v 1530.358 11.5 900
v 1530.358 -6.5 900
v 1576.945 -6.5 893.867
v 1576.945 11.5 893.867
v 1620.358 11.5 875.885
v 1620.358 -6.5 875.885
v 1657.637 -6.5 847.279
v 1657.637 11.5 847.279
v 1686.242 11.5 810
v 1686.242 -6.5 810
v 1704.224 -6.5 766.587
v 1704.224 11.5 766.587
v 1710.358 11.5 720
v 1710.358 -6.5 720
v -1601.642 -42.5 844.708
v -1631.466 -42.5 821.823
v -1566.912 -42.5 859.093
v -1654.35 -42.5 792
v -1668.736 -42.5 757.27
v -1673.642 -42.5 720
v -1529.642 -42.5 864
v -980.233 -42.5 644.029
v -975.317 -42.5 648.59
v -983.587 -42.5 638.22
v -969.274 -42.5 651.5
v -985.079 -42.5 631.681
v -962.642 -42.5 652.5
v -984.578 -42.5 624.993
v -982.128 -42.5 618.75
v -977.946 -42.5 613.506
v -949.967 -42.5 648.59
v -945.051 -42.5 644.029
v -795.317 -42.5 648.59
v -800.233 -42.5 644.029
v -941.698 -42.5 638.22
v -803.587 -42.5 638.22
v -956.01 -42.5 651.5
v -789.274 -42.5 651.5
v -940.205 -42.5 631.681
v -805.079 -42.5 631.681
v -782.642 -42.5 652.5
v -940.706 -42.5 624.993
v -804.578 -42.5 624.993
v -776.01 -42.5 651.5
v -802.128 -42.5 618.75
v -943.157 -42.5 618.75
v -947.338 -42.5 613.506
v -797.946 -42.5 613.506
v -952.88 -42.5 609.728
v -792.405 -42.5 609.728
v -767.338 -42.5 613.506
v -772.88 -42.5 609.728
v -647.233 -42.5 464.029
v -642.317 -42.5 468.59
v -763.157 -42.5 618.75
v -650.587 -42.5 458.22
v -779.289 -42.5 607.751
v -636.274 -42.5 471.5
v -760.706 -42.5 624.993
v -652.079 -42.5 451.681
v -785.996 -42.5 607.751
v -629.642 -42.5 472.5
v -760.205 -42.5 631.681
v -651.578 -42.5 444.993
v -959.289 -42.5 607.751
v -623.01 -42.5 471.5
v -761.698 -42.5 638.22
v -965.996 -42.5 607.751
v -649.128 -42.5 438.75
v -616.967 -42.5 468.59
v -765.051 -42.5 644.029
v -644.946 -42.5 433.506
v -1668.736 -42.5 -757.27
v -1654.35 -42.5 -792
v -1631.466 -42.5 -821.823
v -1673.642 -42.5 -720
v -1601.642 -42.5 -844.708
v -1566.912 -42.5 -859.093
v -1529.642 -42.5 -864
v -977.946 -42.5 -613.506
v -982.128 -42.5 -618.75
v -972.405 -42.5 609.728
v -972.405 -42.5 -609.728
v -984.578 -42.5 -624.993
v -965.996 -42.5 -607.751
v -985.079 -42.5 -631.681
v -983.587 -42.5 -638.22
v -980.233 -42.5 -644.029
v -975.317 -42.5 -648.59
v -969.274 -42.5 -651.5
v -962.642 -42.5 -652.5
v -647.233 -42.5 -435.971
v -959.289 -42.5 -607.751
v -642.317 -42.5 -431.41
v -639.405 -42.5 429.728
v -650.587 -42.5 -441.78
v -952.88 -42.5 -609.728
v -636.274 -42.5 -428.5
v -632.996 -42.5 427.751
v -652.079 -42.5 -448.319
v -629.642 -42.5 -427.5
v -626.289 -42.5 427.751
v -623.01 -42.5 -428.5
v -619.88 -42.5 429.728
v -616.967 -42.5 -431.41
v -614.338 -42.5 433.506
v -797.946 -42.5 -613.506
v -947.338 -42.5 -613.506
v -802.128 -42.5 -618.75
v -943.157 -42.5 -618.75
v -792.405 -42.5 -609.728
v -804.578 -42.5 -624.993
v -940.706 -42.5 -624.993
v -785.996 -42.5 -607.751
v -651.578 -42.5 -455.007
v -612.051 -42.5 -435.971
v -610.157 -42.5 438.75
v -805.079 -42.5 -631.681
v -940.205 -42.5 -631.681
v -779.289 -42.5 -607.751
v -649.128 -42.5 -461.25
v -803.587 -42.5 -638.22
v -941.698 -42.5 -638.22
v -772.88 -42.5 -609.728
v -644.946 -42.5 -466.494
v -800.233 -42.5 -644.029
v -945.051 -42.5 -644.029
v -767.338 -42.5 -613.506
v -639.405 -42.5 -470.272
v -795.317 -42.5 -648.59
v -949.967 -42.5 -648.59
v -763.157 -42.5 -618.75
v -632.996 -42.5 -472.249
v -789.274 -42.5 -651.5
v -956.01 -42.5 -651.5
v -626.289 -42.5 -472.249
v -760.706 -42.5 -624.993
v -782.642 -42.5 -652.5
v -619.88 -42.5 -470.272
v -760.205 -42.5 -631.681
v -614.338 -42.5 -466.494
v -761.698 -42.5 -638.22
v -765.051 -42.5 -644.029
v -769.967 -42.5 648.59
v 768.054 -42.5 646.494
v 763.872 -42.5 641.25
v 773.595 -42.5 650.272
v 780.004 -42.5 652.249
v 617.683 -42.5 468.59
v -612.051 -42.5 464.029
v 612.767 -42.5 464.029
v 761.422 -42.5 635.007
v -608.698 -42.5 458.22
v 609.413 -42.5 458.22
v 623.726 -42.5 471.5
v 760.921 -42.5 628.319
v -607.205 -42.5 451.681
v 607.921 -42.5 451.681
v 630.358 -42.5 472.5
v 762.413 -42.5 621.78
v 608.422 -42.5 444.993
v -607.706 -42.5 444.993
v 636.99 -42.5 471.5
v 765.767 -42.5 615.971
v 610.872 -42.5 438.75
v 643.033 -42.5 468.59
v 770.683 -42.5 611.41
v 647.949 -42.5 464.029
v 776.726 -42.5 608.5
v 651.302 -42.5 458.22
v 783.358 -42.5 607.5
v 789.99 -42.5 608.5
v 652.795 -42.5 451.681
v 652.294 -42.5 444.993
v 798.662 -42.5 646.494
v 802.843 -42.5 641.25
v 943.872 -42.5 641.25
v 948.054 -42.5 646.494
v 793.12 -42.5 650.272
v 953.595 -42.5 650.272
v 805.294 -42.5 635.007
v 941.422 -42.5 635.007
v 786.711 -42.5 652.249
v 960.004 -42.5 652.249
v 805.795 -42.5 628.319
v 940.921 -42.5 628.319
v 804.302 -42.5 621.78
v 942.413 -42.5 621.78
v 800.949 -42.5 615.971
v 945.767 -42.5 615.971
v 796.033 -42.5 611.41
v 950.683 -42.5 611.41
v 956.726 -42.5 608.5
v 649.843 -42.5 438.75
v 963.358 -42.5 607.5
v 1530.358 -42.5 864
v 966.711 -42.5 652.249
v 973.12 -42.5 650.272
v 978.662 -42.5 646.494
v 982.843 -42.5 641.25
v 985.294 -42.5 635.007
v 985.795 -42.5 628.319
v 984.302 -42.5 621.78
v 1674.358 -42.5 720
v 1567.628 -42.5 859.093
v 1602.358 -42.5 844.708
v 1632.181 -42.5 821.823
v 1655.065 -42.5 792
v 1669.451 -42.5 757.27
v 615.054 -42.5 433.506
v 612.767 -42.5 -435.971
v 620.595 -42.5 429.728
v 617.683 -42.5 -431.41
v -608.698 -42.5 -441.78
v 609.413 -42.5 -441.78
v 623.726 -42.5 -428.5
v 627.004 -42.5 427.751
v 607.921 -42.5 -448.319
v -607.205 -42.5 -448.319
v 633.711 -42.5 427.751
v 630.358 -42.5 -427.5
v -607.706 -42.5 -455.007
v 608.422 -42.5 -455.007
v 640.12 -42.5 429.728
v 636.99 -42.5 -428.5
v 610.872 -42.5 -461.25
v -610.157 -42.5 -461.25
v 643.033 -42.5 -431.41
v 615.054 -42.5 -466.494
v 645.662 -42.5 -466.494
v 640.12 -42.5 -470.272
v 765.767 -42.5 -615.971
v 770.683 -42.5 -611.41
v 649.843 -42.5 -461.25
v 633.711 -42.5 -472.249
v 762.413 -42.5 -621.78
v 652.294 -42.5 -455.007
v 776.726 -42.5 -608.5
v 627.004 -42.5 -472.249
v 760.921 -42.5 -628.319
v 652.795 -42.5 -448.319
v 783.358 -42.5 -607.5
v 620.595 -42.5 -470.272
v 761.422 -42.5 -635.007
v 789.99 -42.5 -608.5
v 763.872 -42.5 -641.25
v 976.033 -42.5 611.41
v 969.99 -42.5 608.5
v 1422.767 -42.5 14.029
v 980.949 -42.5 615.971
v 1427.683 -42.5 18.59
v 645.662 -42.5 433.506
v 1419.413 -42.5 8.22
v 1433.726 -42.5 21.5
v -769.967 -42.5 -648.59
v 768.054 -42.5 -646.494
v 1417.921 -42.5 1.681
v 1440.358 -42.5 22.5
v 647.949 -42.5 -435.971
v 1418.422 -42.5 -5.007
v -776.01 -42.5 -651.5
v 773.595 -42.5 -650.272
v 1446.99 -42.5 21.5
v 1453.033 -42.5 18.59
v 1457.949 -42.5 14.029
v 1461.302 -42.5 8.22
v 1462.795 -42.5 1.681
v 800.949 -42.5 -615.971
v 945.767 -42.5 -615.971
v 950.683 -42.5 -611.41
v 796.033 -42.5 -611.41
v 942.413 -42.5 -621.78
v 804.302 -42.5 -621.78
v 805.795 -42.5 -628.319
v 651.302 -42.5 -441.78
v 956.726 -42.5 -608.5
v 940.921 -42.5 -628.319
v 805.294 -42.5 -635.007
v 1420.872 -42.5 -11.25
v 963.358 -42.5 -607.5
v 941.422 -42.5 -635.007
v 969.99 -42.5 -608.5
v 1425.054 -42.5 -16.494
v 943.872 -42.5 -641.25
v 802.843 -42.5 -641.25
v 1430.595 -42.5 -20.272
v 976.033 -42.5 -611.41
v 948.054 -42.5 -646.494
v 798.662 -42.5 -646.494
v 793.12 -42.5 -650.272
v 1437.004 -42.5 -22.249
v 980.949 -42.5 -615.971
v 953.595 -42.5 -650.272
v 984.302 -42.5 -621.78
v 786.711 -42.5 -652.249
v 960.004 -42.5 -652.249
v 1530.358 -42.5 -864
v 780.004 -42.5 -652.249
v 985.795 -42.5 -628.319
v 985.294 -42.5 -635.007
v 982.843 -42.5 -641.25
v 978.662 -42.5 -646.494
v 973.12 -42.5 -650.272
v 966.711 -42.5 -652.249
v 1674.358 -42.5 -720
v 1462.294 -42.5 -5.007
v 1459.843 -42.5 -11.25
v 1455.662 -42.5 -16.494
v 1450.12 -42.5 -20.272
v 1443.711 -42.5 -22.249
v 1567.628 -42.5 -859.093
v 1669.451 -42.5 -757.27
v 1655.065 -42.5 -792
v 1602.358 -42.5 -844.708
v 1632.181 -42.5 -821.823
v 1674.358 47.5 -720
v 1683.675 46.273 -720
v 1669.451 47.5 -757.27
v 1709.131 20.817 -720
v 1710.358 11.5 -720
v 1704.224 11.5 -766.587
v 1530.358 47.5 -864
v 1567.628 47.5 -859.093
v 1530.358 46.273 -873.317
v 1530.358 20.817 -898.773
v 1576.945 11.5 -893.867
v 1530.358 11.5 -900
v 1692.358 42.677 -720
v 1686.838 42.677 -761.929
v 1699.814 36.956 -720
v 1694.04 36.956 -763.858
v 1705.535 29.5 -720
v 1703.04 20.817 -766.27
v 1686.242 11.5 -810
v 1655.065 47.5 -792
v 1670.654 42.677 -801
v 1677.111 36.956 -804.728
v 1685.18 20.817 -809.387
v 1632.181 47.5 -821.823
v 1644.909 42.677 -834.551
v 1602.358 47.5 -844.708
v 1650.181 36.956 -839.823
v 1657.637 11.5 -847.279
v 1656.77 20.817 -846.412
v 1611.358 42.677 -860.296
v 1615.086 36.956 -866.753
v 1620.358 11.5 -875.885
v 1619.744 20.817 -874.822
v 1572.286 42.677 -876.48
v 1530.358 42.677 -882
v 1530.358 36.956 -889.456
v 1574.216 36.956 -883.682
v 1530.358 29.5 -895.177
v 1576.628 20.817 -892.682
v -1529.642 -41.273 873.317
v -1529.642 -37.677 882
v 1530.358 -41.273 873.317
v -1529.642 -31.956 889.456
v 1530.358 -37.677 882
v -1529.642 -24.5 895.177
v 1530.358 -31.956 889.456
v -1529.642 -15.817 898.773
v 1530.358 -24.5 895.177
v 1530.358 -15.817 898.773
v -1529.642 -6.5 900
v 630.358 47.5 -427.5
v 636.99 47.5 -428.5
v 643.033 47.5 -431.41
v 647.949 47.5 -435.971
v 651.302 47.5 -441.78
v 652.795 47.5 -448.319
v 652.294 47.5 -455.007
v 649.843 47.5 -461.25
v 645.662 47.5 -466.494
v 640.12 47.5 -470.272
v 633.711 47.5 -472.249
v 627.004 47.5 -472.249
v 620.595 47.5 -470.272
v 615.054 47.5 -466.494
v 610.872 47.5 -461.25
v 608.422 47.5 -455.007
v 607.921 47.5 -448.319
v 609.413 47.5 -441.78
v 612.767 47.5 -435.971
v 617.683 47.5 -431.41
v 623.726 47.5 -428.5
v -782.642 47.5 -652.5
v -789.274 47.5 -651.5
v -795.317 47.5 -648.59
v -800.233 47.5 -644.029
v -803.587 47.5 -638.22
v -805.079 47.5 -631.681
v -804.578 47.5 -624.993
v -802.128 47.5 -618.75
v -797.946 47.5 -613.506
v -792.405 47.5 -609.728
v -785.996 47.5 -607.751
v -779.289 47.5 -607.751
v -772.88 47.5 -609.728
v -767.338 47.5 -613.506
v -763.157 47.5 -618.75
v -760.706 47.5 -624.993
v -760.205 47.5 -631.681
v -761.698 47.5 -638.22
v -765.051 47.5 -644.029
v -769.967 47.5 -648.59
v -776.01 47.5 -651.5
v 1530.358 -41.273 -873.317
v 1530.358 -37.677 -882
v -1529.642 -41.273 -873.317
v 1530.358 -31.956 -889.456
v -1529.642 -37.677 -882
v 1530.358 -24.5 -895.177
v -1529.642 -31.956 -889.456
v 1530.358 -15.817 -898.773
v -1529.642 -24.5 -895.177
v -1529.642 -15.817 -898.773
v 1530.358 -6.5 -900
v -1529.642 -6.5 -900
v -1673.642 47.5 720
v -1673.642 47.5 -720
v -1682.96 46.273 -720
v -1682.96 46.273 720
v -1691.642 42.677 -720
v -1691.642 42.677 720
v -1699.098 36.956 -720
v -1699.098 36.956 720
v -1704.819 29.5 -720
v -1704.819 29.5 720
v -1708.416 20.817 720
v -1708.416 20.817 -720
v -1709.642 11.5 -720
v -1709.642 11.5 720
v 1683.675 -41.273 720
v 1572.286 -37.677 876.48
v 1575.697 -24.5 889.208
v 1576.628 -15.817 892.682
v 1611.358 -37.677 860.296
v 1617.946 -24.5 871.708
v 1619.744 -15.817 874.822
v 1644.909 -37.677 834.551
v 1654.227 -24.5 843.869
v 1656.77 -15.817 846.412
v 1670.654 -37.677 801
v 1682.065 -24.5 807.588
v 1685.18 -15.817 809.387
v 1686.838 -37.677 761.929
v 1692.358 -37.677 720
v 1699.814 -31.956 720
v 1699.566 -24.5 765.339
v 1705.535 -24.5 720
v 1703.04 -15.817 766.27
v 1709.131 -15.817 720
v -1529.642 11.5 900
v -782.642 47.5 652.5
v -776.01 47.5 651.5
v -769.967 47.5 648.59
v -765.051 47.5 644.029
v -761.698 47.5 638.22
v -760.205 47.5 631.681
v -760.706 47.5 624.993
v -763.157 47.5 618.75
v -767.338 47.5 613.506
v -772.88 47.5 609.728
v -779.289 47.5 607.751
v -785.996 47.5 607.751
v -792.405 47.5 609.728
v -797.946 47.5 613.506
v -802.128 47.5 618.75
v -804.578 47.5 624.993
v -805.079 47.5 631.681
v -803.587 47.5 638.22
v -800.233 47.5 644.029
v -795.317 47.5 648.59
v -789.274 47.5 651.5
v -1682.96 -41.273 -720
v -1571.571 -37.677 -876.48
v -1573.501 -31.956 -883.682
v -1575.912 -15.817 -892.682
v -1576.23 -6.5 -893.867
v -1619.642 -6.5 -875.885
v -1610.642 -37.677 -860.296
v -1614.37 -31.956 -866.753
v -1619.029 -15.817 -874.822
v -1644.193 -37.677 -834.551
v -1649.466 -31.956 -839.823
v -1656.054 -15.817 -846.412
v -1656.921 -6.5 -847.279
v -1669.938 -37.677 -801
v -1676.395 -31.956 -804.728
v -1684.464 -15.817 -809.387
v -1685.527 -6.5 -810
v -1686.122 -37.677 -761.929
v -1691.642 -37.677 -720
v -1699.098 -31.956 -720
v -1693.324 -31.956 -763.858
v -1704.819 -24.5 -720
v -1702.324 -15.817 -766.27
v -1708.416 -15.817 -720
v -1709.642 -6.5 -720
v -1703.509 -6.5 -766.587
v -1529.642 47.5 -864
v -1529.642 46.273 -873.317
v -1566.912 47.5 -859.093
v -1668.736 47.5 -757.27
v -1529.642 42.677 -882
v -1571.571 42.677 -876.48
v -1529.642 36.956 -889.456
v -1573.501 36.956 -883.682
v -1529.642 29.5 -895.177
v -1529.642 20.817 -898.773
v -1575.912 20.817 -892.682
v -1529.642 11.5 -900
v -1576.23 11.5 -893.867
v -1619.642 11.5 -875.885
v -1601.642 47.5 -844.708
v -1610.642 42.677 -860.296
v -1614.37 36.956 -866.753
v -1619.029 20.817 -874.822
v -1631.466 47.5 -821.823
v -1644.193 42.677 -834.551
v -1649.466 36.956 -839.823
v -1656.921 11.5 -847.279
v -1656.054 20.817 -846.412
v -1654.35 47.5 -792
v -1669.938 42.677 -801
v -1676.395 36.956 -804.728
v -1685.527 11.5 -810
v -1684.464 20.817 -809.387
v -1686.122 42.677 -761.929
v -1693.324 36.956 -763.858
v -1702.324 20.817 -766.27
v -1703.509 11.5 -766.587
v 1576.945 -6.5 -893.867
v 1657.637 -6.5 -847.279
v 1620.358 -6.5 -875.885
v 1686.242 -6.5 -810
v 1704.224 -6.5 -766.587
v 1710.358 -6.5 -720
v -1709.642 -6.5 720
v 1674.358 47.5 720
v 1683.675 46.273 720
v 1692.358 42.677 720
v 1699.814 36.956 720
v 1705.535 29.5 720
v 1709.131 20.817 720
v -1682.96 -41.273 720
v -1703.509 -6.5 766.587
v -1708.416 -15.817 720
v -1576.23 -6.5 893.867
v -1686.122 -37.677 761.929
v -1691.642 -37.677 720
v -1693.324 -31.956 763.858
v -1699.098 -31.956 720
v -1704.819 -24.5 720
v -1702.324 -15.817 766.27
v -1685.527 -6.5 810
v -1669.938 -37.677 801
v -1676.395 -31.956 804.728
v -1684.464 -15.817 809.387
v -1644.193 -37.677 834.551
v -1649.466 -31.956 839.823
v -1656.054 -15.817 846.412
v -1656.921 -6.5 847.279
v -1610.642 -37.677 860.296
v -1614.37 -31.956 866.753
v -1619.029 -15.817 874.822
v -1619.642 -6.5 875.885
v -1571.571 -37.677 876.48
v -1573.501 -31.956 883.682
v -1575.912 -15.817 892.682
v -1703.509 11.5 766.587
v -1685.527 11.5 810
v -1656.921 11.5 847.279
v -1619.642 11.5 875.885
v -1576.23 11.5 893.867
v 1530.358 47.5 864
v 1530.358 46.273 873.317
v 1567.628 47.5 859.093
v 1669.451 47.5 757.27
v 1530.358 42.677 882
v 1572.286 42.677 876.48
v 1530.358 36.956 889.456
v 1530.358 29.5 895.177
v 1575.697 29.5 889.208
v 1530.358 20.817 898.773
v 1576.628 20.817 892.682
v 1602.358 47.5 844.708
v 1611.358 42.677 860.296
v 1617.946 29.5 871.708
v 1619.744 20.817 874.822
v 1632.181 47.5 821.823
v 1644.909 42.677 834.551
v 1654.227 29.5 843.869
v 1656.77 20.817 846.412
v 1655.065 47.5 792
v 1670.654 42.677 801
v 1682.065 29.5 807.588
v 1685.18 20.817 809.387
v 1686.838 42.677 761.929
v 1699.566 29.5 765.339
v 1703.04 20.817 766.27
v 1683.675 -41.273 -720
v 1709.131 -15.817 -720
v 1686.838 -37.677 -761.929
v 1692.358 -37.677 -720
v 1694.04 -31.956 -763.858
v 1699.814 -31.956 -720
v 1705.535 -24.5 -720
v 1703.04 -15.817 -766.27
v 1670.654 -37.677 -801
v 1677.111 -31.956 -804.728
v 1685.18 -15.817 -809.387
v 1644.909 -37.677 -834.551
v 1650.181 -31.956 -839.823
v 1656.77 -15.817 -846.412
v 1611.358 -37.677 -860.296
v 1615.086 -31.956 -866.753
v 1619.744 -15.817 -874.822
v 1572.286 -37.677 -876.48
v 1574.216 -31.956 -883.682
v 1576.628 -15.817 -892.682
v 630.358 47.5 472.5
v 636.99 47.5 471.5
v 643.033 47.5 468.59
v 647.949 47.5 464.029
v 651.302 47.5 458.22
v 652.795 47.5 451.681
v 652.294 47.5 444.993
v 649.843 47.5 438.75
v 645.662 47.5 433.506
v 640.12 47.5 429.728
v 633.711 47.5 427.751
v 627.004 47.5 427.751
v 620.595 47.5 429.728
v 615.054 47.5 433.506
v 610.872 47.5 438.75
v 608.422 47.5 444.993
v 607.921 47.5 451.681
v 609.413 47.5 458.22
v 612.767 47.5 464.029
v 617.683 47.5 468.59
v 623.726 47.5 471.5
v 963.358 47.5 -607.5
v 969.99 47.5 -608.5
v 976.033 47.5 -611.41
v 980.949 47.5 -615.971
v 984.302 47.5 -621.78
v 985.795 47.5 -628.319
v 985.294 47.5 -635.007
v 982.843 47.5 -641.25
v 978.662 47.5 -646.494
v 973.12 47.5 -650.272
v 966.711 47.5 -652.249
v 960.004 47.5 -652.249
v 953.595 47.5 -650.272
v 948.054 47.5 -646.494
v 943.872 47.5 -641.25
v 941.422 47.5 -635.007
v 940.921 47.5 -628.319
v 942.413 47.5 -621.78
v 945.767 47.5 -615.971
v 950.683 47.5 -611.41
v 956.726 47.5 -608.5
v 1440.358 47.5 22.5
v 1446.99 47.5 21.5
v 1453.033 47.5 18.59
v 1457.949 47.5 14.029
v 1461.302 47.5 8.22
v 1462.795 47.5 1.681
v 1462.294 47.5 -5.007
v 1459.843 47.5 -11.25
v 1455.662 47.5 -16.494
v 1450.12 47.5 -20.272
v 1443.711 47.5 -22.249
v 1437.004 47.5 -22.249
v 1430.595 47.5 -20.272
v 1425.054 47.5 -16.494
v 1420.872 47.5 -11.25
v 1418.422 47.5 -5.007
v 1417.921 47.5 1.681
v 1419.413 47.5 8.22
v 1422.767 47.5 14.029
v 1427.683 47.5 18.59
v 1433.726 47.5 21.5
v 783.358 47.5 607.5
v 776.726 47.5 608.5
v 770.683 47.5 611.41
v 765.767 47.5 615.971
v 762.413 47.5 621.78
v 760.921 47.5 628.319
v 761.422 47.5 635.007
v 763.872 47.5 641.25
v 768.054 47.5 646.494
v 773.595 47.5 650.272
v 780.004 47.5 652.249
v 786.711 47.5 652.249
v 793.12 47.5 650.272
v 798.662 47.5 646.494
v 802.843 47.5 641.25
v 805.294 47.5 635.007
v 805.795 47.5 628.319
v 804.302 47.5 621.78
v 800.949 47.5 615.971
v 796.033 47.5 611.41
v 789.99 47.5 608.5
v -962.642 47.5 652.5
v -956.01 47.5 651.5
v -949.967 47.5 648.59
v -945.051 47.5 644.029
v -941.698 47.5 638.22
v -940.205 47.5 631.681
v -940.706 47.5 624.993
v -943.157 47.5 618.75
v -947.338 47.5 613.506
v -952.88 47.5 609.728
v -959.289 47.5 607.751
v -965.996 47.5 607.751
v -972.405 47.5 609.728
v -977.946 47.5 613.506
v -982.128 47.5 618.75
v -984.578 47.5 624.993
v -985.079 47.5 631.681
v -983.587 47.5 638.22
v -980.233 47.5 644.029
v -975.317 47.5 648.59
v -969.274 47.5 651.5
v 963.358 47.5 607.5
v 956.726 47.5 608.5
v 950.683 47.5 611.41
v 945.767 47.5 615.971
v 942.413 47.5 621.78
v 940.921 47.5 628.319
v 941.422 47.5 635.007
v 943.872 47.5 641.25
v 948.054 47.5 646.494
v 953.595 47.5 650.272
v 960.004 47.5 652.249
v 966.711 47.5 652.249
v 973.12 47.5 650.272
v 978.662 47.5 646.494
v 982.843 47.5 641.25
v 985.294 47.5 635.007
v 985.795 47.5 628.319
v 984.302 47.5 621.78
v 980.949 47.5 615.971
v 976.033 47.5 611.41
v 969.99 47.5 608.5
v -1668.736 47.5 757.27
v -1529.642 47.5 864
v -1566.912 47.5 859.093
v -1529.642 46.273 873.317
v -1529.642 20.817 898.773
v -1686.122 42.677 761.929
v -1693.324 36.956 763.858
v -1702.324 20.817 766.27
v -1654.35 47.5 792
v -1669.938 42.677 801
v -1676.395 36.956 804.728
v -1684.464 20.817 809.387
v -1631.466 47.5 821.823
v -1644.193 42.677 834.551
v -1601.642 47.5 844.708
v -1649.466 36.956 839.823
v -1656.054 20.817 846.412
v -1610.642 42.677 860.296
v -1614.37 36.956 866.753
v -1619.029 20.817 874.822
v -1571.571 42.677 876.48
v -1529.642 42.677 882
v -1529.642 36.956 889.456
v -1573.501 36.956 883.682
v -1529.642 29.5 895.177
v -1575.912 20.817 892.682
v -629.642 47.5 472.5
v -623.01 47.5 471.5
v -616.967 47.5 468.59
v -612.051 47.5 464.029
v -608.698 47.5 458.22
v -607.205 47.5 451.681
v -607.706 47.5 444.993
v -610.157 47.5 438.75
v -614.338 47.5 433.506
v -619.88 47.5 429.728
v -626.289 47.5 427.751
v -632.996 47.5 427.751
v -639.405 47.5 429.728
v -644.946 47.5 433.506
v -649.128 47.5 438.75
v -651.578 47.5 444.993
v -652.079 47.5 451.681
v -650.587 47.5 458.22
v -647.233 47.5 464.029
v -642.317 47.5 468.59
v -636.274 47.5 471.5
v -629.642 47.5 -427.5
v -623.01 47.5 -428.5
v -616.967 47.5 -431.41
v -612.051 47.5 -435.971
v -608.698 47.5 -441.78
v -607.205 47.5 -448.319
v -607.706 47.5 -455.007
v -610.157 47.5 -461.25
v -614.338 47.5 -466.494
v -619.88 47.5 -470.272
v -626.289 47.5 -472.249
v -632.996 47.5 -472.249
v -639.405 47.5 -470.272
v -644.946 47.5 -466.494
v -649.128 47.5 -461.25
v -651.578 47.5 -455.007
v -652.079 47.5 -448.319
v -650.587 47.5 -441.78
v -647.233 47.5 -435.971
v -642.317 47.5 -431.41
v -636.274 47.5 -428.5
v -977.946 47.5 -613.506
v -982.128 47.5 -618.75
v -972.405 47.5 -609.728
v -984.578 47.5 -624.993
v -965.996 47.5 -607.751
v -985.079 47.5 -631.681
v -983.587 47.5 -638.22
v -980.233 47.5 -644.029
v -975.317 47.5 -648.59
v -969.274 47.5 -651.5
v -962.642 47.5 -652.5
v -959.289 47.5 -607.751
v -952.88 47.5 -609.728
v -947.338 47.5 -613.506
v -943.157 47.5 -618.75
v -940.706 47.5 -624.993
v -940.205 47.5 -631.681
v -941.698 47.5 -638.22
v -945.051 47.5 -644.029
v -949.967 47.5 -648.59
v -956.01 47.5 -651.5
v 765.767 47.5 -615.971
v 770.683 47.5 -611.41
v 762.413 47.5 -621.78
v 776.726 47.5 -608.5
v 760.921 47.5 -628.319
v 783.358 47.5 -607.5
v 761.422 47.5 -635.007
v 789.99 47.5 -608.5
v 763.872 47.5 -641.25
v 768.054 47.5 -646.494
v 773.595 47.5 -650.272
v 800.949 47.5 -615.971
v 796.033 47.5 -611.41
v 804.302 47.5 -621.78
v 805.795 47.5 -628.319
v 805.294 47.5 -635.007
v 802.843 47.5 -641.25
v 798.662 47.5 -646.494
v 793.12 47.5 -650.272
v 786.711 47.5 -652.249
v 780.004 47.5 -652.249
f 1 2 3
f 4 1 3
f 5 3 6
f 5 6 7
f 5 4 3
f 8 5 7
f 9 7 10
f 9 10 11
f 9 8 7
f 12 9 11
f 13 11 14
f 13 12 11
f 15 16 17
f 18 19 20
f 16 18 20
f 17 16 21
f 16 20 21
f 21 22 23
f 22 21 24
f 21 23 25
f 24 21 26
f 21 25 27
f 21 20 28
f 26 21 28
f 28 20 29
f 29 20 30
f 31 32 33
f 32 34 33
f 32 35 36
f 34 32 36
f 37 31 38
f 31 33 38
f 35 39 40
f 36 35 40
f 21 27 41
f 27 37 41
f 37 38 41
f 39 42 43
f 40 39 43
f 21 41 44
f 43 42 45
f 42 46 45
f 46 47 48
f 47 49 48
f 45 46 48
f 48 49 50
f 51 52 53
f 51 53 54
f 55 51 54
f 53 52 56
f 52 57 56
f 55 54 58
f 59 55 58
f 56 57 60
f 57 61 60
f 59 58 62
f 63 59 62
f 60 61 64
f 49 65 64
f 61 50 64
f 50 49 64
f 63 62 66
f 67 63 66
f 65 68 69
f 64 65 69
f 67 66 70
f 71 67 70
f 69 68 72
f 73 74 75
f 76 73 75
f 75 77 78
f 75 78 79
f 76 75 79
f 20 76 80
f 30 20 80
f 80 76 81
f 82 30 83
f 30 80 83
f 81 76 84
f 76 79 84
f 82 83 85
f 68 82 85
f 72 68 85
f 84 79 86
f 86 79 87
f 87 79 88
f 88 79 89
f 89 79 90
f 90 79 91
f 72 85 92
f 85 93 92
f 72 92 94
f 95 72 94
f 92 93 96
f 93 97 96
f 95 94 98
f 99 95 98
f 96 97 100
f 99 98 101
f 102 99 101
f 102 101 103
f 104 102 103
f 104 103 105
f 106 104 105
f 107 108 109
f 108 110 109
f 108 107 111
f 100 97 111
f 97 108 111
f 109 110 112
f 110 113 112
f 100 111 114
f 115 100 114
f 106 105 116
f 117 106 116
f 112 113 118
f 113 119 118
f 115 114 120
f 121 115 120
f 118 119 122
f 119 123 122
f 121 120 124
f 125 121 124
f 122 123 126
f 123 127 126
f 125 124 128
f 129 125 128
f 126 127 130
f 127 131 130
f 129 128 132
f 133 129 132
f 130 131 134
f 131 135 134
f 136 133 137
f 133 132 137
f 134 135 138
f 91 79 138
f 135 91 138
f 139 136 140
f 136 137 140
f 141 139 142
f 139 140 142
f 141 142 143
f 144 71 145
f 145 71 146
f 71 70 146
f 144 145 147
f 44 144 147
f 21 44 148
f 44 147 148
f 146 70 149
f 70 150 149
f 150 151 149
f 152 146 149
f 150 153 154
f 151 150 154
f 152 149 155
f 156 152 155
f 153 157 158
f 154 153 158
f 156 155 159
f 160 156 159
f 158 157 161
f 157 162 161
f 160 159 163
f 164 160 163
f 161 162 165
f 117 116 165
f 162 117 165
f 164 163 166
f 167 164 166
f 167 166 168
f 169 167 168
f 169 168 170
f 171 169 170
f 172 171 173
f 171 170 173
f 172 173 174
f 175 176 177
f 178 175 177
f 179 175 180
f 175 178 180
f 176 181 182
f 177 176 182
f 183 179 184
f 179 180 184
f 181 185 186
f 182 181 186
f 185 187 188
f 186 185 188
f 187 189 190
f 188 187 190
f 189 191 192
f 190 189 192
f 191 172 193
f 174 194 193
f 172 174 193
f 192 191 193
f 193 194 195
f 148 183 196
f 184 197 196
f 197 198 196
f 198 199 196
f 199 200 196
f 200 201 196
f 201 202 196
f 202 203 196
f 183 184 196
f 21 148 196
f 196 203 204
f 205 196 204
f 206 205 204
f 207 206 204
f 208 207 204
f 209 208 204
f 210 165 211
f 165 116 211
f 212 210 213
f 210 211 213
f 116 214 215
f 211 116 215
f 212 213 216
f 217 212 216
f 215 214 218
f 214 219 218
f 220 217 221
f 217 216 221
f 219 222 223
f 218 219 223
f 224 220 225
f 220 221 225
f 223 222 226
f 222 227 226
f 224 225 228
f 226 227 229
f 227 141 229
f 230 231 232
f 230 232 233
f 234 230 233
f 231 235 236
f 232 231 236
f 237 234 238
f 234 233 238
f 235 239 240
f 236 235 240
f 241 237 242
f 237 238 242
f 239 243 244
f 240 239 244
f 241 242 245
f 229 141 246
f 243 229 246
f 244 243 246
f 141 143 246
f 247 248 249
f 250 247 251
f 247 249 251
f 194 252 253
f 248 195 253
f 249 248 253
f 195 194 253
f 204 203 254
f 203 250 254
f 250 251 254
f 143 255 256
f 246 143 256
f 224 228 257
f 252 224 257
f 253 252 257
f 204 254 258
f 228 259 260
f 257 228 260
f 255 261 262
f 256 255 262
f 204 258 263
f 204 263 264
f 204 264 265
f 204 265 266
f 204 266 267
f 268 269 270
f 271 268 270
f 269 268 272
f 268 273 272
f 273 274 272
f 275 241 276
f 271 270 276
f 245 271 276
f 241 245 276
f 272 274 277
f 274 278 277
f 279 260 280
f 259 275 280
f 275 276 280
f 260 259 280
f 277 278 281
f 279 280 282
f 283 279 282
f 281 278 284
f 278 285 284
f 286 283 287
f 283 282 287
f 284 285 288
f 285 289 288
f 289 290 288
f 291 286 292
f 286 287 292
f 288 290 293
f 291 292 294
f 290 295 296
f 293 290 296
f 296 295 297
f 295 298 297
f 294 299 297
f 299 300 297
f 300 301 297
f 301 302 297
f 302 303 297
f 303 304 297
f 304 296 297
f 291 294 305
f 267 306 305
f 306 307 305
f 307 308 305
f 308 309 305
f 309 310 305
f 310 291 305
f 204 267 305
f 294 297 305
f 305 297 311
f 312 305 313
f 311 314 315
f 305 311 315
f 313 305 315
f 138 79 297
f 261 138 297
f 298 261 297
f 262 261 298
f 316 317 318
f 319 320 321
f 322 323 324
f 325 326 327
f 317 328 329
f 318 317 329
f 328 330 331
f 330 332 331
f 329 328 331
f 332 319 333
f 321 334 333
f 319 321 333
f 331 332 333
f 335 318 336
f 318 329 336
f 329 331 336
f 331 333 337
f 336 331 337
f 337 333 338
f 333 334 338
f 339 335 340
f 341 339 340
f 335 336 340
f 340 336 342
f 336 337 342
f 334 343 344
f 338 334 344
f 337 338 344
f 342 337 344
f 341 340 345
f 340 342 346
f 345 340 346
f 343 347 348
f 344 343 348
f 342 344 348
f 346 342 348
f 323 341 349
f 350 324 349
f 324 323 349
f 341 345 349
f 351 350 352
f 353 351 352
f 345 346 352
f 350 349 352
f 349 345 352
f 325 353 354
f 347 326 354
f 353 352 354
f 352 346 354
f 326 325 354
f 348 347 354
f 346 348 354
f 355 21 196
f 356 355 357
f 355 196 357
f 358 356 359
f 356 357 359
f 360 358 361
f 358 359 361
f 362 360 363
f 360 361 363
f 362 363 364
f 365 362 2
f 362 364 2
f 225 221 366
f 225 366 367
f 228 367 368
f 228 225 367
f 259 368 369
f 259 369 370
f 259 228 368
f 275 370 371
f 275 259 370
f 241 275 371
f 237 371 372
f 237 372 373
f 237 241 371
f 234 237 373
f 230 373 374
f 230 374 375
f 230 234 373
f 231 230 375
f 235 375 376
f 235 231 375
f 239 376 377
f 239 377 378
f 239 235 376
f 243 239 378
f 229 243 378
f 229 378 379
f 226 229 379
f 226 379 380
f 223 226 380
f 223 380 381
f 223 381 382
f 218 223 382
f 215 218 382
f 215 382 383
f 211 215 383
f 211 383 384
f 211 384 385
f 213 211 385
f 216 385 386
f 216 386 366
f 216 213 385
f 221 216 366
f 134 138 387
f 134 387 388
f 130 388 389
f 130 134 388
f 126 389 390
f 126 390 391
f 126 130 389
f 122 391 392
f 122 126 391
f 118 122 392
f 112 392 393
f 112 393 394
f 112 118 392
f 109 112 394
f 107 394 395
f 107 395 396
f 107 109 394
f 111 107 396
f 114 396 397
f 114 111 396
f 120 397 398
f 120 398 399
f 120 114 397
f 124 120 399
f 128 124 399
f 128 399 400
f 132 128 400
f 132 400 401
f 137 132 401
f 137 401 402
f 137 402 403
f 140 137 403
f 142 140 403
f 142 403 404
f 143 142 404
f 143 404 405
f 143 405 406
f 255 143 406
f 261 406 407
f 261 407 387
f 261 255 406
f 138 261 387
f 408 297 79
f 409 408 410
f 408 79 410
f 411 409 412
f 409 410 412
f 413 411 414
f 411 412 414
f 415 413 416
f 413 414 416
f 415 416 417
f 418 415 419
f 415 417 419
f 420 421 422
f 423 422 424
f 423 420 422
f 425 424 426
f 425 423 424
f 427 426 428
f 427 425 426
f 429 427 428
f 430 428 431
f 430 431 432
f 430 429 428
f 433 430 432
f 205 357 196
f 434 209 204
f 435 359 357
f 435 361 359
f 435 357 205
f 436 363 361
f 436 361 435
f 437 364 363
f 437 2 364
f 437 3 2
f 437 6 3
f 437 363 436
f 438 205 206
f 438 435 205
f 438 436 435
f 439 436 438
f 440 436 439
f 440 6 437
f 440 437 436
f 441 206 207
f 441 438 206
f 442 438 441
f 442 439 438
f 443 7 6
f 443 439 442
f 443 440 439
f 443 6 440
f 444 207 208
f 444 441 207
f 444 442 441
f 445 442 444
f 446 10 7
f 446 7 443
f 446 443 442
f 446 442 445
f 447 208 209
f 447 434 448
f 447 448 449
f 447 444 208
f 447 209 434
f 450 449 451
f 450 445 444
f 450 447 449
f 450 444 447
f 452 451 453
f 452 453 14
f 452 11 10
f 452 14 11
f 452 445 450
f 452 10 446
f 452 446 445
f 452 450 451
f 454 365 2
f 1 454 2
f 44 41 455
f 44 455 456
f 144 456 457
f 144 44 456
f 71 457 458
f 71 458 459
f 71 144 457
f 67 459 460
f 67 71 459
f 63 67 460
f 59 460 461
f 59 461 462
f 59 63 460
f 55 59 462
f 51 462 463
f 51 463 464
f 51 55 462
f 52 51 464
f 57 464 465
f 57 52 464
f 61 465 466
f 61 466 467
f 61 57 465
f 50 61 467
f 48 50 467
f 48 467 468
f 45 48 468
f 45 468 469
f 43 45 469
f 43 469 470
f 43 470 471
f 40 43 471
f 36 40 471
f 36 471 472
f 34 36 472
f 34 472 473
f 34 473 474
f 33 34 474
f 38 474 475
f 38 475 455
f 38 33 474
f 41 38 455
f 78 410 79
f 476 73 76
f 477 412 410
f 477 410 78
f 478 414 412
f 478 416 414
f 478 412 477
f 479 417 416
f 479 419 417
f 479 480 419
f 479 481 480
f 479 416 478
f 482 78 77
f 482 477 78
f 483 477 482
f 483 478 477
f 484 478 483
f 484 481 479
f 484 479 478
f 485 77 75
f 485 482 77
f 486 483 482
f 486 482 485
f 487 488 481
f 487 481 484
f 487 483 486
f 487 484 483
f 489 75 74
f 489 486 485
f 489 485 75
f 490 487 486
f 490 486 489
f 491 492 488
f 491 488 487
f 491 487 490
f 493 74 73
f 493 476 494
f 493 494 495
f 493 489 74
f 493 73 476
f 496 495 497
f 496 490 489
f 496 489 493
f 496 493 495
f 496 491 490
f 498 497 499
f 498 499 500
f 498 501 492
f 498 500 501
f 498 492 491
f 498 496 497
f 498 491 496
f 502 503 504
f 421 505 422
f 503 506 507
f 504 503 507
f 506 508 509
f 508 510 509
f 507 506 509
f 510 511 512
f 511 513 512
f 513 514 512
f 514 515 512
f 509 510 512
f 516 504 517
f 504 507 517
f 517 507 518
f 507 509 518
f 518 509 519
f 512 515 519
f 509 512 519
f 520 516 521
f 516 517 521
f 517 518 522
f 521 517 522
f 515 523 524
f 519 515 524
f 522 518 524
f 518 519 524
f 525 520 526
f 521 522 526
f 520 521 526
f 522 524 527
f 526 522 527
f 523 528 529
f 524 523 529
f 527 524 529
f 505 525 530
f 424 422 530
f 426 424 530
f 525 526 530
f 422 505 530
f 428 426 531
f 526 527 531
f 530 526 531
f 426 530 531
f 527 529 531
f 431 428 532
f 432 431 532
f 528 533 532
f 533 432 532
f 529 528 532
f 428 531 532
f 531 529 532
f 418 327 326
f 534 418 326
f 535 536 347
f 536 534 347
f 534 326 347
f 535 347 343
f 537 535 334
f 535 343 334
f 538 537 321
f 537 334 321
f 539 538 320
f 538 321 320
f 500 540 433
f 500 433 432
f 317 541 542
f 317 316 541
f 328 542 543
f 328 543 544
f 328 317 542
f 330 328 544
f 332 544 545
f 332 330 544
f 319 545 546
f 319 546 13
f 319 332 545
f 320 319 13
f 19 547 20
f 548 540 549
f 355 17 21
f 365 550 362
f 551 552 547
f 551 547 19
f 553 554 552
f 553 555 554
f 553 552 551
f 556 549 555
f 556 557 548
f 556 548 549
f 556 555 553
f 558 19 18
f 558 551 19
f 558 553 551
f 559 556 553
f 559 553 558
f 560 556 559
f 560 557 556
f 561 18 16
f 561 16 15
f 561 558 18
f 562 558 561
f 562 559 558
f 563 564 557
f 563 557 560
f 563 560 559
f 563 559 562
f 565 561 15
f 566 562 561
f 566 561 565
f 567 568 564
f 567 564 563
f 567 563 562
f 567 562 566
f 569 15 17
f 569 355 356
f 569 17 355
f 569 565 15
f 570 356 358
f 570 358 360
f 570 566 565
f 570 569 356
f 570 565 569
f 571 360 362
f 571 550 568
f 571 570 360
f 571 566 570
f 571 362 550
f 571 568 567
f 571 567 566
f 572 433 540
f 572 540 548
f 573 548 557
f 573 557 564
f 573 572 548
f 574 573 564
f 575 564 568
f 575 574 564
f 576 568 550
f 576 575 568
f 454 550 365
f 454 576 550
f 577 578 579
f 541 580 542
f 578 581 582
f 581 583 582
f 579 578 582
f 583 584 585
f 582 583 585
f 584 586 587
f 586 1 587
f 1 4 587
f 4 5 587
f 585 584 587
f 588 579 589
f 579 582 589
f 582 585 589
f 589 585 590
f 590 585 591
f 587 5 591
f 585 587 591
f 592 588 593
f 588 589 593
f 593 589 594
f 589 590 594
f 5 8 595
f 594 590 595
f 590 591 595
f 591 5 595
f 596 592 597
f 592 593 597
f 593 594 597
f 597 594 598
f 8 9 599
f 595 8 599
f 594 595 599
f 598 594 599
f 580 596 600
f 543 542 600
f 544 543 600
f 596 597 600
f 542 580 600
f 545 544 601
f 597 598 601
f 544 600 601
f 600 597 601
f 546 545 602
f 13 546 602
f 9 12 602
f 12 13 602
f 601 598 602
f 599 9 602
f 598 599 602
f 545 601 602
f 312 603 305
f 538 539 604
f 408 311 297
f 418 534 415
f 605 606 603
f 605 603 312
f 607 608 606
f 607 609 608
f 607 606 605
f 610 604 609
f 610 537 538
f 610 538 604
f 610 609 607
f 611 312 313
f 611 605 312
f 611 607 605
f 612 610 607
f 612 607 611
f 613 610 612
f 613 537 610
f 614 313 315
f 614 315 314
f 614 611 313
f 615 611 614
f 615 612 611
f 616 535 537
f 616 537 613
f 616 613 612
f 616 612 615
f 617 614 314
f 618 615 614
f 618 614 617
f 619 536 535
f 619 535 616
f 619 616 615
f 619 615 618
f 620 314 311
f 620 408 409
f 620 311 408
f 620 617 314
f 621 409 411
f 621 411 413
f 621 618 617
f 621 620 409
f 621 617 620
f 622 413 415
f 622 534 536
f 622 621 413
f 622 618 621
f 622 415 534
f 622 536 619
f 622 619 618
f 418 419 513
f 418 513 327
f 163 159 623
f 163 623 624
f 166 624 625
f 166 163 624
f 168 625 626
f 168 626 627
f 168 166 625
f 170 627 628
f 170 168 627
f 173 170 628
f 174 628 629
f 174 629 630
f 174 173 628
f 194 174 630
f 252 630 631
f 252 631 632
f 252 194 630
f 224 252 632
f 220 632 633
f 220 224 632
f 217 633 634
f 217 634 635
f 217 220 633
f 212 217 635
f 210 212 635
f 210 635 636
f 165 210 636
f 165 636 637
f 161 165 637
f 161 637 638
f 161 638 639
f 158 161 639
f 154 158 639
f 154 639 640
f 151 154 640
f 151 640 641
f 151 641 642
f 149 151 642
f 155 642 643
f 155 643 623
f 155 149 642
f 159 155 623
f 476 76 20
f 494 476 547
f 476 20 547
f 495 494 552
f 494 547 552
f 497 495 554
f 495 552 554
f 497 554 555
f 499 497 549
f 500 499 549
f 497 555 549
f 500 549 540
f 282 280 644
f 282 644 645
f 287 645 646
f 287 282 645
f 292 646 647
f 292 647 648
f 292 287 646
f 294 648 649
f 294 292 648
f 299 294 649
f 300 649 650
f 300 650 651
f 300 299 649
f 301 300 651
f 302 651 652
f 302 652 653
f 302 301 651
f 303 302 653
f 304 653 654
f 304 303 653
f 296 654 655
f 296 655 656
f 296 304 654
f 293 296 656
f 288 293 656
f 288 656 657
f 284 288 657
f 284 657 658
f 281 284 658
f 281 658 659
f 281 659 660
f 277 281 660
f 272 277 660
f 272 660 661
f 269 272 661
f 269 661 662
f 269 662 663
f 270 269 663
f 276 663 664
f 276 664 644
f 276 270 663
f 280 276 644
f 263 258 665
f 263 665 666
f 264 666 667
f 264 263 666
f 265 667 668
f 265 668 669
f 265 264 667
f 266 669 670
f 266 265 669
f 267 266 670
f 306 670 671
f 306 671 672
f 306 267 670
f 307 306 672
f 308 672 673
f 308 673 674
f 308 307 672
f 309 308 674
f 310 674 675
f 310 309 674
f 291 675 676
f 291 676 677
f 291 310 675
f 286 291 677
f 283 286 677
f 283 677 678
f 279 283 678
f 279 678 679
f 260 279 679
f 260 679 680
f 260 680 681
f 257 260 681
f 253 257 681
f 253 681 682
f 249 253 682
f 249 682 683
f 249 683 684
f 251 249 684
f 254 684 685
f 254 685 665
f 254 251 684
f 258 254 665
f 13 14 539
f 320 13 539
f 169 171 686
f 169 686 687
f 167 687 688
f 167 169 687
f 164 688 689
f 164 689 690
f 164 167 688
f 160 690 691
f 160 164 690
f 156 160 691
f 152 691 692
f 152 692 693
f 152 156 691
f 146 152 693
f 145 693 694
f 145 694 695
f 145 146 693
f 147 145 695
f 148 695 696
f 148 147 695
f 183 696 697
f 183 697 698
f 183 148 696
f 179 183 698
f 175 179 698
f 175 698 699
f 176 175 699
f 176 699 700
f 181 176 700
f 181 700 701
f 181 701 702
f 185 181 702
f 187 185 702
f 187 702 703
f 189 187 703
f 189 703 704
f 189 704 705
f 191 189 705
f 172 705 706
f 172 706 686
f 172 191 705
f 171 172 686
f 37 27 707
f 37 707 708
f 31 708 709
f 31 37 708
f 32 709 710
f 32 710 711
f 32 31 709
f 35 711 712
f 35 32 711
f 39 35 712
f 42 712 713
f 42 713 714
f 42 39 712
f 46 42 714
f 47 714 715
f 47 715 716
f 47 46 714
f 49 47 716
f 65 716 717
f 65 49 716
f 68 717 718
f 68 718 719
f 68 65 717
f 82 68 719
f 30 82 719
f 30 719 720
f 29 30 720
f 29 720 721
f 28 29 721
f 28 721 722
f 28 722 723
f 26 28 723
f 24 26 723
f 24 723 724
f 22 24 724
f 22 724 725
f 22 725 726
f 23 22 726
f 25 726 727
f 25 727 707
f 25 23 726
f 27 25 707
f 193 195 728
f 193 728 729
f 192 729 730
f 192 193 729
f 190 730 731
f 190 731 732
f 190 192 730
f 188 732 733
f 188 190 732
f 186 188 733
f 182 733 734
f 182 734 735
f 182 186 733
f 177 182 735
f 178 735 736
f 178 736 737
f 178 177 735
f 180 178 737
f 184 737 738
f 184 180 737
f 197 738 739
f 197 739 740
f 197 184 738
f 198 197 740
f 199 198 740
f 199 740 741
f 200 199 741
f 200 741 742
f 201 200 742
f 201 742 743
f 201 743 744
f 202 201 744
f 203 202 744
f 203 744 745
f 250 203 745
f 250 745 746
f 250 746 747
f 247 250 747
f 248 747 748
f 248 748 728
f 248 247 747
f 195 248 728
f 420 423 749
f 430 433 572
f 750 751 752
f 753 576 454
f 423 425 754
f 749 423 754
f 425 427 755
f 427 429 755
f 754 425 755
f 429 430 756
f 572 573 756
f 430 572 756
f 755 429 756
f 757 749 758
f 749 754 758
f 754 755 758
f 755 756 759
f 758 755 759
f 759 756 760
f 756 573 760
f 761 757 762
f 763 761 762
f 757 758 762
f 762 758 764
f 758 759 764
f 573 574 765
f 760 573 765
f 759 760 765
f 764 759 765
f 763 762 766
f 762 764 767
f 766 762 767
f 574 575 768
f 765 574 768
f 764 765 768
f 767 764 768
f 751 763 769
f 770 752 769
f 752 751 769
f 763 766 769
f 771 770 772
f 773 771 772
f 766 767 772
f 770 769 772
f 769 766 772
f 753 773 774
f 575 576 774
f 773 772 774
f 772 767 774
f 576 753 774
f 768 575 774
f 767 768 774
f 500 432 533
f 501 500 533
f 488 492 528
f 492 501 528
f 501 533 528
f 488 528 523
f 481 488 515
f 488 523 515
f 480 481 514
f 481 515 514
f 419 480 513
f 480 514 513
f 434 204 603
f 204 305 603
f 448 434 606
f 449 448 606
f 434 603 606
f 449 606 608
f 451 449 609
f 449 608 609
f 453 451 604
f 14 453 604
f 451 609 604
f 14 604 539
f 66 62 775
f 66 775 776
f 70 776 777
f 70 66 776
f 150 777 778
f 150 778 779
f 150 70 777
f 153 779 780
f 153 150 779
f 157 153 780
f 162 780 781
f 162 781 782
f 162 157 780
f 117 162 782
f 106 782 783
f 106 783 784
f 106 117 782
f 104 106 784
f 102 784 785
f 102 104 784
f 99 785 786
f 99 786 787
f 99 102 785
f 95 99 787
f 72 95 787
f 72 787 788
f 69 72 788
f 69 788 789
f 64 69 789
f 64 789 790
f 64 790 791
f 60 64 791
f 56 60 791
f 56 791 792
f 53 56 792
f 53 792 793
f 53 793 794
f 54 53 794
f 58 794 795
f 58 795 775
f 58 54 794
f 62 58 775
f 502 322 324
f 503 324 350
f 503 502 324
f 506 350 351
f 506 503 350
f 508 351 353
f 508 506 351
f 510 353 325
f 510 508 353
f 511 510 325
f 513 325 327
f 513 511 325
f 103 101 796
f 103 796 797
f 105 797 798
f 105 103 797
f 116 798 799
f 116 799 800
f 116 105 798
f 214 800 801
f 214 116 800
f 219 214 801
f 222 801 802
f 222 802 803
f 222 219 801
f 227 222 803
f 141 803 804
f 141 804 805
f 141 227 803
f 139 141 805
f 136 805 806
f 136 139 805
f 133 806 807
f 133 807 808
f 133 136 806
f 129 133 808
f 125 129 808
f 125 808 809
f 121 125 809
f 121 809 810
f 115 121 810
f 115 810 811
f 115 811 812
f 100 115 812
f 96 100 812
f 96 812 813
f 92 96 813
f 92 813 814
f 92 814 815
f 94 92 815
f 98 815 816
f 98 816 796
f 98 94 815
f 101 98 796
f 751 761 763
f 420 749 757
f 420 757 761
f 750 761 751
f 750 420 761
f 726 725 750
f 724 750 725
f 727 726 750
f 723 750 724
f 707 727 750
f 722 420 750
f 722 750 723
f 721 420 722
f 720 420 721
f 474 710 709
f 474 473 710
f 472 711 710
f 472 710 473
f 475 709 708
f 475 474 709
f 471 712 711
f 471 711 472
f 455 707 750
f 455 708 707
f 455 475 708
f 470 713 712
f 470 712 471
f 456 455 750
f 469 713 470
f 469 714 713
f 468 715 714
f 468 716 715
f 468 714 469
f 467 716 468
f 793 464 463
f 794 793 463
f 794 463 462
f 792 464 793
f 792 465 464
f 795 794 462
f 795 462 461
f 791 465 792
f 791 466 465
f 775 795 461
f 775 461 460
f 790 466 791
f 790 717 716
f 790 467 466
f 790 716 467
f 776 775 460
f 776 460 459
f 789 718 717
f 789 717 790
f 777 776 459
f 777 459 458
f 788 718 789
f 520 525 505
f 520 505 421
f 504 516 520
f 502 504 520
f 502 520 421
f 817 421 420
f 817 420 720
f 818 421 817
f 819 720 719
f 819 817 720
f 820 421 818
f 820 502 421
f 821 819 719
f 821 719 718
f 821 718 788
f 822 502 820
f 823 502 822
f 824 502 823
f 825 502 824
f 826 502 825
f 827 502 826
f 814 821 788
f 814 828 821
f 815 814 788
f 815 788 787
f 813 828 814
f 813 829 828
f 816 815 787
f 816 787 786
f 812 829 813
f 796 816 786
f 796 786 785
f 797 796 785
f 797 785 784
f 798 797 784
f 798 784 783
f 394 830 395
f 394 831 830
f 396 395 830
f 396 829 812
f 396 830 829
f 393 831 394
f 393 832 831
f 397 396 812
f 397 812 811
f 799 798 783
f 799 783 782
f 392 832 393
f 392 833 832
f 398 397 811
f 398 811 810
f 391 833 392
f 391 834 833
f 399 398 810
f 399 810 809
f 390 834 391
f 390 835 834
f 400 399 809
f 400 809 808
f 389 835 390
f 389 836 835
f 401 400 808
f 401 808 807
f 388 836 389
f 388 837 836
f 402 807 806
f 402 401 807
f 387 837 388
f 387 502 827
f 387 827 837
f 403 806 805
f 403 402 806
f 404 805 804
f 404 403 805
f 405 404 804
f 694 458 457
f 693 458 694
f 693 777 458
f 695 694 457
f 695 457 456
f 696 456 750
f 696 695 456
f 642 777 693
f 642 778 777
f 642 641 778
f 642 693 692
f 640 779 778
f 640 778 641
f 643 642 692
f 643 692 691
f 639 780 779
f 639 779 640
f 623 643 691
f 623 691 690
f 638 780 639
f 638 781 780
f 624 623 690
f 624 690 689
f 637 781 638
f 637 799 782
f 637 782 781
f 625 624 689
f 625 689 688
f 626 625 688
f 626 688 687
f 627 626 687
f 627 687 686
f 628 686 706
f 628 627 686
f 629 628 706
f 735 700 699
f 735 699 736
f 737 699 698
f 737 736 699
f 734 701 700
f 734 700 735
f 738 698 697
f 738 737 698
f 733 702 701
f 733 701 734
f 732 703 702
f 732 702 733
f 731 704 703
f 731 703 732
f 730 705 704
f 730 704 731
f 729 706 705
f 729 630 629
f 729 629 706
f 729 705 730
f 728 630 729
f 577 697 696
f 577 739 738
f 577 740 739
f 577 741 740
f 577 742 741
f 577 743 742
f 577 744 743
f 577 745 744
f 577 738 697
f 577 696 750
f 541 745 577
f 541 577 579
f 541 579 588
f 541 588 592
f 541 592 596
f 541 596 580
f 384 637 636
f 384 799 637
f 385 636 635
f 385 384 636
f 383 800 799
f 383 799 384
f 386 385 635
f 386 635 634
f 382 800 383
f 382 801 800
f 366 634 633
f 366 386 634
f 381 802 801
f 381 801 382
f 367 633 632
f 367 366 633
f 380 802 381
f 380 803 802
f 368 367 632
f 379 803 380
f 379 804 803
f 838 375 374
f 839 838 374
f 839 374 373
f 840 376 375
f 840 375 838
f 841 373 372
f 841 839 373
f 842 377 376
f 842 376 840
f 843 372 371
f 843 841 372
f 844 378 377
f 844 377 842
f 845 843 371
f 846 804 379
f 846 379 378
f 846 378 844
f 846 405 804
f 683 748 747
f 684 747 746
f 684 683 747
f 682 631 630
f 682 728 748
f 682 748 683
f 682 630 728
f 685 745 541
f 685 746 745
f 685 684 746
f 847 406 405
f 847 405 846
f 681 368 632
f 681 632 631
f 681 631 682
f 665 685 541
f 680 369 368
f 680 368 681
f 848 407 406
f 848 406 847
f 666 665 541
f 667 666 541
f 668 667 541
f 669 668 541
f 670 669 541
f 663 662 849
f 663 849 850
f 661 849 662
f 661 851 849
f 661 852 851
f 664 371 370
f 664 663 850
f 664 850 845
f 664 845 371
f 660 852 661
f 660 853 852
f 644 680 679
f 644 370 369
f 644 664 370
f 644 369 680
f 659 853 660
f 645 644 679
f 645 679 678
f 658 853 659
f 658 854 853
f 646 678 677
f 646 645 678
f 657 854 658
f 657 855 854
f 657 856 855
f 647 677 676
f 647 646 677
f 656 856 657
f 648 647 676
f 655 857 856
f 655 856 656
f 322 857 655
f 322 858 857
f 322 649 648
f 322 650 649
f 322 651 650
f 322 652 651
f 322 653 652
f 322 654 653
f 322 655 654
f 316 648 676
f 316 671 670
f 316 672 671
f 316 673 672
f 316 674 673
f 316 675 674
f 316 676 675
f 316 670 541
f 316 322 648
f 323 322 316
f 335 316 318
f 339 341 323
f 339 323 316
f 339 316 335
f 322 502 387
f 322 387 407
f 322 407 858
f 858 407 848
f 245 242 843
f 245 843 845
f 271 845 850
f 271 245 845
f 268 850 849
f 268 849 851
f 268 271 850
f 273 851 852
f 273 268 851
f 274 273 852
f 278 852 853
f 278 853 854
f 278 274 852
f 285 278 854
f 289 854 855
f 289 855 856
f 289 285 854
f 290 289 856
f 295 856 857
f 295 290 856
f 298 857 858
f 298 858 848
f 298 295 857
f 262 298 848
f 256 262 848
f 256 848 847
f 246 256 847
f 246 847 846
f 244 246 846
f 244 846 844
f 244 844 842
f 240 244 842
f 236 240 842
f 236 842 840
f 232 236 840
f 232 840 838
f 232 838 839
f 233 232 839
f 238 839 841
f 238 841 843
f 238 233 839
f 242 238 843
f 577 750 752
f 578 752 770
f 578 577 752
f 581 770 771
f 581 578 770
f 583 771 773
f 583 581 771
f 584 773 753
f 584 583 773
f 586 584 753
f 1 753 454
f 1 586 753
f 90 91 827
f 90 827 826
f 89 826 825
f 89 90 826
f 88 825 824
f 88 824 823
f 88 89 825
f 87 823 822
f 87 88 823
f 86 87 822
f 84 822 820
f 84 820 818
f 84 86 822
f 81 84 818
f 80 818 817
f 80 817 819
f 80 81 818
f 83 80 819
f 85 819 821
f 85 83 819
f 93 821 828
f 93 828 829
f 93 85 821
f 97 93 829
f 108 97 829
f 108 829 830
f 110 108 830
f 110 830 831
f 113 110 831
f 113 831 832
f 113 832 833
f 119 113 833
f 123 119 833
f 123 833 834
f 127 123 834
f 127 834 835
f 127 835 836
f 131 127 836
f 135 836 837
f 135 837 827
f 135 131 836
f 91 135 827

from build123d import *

# Parameters (mm, degrees)
SKETCH1_W           = 190
SKETCH1_H           = 100
SKETCH1_R           = 1.25
BOSS_EXTRUDE1_DEPTH = 5
FILLET1_R           = 10
FILLET2_R           = 2
SCALE1_SCALE        = 18


with BuildPart() as part:
    # Sketch1 → Boss-Extrude1 (new body)
    with BuildSketch(Plane(origin=(0, 0, 0), x_dir=(1, 0, 0), z_dir=(0, 1, 0))):
        Rectangle(SKETCH1_W, SKETCH1_H)
        with Locations(Location((-35, 25, 0), (0, 0, 270))):
            Circle(SKETCH1_R, mode=Mode.SUBTRACT)
        with Locations(Location((35, 25, 0), (0, 0, 270))):
            Circle(SKETCH1_R, mode=Mode.SUBTRACT)
        with Locations(Location((35, -25, 0), (0, 0, 270))):
            Circle(SKETCH1_R, mode=Mode.SUBTRACT)
        with Locations(Location((-35, -25, 0), (0, 0, 270))):
            Circle(SKETCH1_R, mode=Mode.SUBTRACT)
        with Locations(Location((80, 0, 0), (0, 0, 270))):
            Circle(SKETCH1_R, mode=Mode.SUBTRACT)
        with Locations(Location((-53.5, -35, 0), (0, 0, 270))):
            Circle(SKETCH1_R, mode=Mode.SUBTRACT)
        with Locations(Location((-43.5, -35, 0), (0, 0, 270))):
            Circle(SKETCH1_R, mode=Mode.SUBTRACT)
        with Locations(Location((-43.5, 35, 0), (0, 0, 90))):
            Circle(SKETCH1_R, mode=Mode.SUBTRACT)
        with Locations(Location((-53.5, 35, 0), (0, 0, 90))):
            Circle(SKETCH1_R, mode=Mode.SUBTRACT)
        with Locations(Location((43.5, 35, 0), (0, 0, 270))):
            Circle(SKETCH1_R, mode=Mode.SUBTRACT)
        with Locations(Location((53.5, 35, 0), (0, 0, 270))):
            Circle(SKETCH1_R, mode=Mode.SUBTRACT)
        with Locations(Location((53.5, -35, 0), (0, 0, 90))):
            Circle(SKETCH1_R, mode=Mode.SUBTRACT)
        with Locations(Location((43.5, -35, 0), (0, 0, 90))):
            Circle(SKETCH1_R, mode=Mode.SUBTRACT)
    extrude(amount=BOSS_EXTRUDE1_DEPTH)

    # Fillet1
    fillet1_edges = [part.edges().sort_by_distance(p)[0] for p in [
        (95, 2.5, 50),
        (-95, 2.5, 50),
        (-95, 2.5, -50),
        (95, 2.5, -50),
    ]]
    fillet(fillet1_edges, radius=FILLET1_R)

    # Fillet2
    fillet2_edges = [part.edges().sort_by_distance(p)[0] for p in [
        (95, 0, 0),
        (95, 5, 0),
        (0, 0, 50),
        (-95, 0, 0),
        (0, 0, -50),
        (-92.071067812, 0, 47.071067812),
        (-92.071067812, 0, -47.071067812),
        (92.071067812, 0, -47.071067812),
        (92.071067812, 0, 47.071067812),
        (0, 5, 50),
        (0, 5, -50),
        (-95, 5, 0),
        (-92.071067812, 5, 47.071067812),
        (-92.071067812, 5, -47.071067812),
        (92.071067812, 5, -47.071067812),
        (92.071067812, 5, 47.071067812),
    ]]
    fillet(fillet2_edges, radius=FILLET2_R)


with BuildPart() as part_1:
    # Scale1: scaled about (-0.021047162, 2.5, 0)
    add(part.part.scale(SCALE1_SCALE).moved(Location((0.357801754, -42.5, 0))))


solid = part_1.part
